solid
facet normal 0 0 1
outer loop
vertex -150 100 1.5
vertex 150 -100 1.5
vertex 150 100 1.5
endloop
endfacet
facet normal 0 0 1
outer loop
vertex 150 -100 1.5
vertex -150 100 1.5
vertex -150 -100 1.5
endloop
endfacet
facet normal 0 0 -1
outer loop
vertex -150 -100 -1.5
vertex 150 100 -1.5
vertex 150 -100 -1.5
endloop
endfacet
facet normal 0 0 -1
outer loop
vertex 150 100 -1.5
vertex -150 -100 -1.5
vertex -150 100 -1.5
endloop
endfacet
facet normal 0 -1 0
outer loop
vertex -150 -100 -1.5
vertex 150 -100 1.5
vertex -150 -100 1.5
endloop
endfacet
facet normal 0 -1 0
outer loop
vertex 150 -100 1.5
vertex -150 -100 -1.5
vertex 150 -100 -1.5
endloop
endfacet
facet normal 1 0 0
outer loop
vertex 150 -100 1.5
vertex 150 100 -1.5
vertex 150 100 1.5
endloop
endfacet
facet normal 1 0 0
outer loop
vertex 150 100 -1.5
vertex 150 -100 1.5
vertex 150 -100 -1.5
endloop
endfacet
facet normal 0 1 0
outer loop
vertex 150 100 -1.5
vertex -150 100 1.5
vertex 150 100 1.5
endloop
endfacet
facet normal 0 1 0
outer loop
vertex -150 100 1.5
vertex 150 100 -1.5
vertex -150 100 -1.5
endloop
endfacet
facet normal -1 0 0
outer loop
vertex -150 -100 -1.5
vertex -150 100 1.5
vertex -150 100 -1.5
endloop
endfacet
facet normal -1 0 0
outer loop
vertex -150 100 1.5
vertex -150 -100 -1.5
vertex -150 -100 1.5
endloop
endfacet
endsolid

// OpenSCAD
$fn=64;

module dibond_sheet(length=300, width=200, thickness=3) {
    translate([-length/2, -width/2, -thickness/2])
        cube([length, width, thickness], center=false);
}

dibond_sheet();
